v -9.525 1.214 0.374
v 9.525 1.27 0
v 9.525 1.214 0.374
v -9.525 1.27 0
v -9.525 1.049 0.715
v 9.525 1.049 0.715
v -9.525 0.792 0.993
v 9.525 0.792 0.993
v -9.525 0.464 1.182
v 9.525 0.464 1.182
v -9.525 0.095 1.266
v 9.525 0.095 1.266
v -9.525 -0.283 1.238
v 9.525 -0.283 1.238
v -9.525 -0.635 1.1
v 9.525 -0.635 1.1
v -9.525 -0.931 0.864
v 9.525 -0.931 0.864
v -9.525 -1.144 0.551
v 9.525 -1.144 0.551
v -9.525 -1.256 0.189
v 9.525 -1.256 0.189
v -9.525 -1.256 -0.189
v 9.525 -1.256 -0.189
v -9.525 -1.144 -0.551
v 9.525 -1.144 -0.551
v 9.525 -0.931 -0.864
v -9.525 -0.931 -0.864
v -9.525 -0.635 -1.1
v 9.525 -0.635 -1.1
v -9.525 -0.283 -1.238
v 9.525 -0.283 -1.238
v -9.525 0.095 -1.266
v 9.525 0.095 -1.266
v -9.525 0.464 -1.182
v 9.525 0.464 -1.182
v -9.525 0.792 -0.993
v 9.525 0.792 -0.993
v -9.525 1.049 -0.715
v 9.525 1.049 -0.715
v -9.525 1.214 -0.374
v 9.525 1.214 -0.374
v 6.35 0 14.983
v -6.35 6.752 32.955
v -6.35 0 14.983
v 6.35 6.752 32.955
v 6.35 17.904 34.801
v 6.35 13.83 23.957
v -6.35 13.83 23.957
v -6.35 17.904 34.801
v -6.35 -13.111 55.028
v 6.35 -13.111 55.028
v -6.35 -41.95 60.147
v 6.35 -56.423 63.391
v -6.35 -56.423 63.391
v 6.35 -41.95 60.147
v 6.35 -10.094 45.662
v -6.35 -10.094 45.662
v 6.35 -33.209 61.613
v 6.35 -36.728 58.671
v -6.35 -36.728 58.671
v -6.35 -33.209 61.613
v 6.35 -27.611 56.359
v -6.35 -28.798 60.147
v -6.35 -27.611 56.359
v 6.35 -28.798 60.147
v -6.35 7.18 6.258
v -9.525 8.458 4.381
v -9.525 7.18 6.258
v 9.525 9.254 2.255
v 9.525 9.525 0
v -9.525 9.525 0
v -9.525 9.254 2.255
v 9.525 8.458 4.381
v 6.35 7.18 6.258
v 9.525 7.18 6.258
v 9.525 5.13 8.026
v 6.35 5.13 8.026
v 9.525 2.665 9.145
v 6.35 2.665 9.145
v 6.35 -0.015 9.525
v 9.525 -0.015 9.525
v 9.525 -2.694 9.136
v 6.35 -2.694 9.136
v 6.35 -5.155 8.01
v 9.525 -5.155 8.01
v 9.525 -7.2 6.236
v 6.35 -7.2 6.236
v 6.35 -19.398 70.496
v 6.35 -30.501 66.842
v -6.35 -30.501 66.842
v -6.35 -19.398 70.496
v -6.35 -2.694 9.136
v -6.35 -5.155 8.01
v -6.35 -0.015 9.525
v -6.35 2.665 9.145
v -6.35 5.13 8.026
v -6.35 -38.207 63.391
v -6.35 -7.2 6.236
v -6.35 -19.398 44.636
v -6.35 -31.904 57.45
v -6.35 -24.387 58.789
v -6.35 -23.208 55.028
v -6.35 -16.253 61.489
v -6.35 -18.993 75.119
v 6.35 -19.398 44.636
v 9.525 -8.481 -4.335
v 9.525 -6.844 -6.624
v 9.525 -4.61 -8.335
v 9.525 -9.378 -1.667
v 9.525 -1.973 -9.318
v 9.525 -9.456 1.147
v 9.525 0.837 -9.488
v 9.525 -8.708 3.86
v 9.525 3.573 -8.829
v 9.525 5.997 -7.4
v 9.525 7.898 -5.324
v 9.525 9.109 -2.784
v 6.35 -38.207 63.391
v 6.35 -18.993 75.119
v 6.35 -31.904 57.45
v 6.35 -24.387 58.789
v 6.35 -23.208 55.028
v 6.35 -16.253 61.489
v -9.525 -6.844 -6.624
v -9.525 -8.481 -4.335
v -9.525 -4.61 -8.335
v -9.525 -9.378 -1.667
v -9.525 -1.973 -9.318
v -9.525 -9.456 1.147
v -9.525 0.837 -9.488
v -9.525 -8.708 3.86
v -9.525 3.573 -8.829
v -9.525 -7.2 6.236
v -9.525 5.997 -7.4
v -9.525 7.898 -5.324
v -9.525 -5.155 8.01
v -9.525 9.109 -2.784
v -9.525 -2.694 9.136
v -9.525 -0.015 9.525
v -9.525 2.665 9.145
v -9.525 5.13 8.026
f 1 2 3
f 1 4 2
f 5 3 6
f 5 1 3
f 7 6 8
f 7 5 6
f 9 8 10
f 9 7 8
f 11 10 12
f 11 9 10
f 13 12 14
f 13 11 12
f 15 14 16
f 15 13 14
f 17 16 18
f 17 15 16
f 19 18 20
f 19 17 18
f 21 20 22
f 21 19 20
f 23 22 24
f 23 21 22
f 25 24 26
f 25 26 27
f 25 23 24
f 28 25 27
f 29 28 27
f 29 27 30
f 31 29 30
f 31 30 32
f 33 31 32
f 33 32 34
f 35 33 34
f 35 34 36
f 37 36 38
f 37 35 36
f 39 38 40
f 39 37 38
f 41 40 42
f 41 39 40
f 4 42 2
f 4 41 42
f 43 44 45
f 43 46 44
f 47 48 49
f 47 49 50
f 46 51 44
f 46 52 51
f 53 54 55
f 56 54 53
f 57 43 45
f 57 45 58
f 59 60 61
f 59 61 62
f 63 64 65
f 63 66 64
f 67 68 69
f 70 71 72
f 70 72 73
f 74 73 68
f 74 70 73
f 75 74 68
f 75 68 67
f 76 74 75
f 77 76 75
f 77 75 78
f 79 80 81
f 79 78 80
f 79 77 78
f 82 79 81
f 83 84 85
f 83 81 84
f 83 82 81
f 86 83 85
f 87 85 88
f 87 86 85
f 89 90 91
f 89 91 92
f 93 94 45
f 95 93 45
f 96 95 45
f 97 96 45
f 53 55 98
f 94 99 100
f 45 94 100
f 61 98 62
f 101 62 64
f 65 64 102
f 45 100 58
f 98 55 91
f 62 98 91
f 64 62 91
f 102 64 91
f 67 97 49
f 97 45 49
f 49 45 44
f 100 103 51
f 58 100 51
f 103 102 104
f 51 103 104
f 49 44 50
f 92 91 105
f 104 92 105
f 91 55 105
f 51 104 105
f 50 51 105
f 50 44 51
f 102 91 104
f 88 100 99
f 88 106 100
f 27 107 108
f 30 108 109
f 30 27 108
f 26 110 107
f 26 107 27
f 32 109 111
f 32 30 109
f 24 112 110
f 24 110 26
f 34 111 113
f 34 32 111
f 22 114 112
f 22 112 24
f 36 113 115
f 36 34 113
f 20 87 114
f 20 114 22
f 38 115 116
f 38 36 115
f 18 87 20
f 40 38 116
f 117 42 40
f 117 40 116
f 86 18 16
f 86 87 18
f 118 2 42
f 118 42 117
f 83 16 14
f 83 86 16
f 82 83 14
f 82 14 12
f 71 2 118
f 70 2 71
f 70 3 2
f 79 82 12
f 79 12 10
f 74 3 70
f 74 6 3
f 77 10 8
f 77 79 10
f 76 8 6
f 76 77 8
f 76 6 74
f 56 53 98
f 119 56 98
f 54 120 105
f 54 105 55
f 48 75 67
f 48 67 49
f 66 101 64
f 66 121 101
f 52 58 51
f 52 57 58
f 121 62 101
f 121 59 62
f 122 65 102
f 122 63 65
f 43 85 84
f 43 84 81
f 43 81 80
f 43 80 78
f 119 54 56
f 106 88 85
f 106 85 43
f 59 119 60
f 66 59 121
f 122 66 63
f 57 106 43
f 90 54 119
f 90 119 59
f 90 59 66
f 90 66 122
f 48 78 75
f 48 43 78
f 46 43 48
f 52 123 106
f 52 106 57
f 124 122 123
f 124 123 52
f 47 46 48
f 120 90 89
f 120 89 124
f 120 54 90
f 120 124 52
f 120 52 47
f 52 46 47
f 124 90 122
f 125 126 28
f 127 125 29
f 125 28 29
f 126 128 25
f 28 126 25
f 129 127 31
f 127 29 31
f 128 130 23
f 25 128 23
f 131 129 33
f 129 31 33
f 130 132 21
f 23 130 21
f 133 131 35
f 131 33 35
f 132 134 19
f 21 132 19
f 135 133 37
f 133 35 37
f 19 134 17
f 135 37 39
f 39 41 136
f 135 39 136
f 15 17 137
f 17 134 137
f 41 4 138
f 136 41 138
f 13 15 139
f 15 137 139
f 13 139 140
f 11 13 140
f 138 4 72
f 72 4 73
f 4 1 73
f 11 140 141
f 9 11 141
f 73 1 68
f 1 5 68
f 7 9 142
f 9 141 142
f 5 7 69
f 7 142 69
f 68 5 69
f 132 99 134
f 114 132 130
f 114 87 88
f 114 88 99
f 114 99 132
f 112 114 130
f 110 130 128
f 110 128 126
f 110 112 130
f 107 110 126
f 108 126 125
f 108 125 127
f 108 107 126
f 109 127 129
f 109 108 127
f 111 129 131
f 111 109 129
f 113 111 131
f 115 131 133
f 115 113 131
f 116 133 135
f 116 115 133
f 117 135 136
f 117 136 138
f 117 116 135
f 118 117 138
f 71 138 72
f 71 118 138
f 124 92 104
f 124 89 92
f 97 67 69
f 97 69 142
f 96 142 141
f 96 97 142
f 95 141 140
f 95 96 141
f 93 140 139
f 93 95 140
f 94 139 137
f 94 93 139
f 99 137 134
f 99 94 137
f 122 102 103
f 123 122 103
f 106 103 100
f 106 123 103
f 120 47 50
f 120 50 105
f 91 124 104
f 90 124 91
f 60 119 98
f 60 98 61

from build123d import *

# Parameters (mm, degrees)
F0_R     = 1.27
F1_DEPTH = 9.525
F2_DEPTH = 6.35


with BuildPart() as f1:
    # F0 (on Right) → F1 (new body, symmetric)
    with BuildSketch(Plane.YZ):
        with BuildLine():
            ThreePointArc((-7.199729, 6.236147), (-3.327777, -8.92477), (9.525, 0))
            ThreePointArc((9.525, 0), (8.919603, 3.341602), (7.180369, 6.258429))
            ThreePointArc((7.180369, 6.258429), (-0.014759, 9.524989), (-7.199729, 6.236147))
        make_face()
        Circle(F0_R, mode=Mode.SUBTRACT)
    extrude(amount=F1_DEPTH, both=True)

    # F0 (on Right) → F2 (join, symmetric)
    with BuildSketch(Plane.YZ):
        with BuildLine():
            ThreePointArc((-7.199729, 6.236147), (-0.014759, 9.524989), (7.180369, 6.258429))
            Line((7.180369, 6.258429), (13.829825, 23.957072))
            Line((13.829825, 23.957072), (17.903983, 34.801126))
            Line((17.903983, 34.801126), (-18.993251, 75.119182))
            Line((-18.993251, 75.119182), (-56.423347, 63.391089))
            Line((-56.423347, 63.391089), (-41.950375, 60.147148))
            Line((-41.950375, 60.147148), (-38.207367, 63.391089))
            Line((-38.207367, 63.391089), (-36.728468, 58.671199))
            Line((-36.728468, 58.671199), (-33.208895, 61.61258))
            Line((-33.208895, 61.61258), (-31.90448, 57.449549))
            Line((-31.90448, 57.449549), (-28.797716, 60.147148))
            Line((-28.797716, 60.147148), (-27.610865, 56.359325))
            Line((-27.610865, 56.359325), (-24.386536, 58.789425))
            Line((-24.386536, 58.789425), (-23.207981, 55.028077))
            Line((-23.207981, 55.028077), (-19.397542, 44.635847))
            Line((-19.397542, 44.635847), (-7.199729, 6.236147))
        make_face()
        Polygon((-30.50116, 66.842455), (-19.397542, 70.495695), (-16.252705, 61.489249), align=None, mode=Mode.SUBTRACT)
        Polygon((0, 14.982579), (-10.09386, 45.661755), (-13.11075, 55.028077), (6.752282, 32.954909), align=None, mode=Mode.SUBTRACT)
    extrude(amount=F2_DEPTH, both=True)


solid = f1.part
